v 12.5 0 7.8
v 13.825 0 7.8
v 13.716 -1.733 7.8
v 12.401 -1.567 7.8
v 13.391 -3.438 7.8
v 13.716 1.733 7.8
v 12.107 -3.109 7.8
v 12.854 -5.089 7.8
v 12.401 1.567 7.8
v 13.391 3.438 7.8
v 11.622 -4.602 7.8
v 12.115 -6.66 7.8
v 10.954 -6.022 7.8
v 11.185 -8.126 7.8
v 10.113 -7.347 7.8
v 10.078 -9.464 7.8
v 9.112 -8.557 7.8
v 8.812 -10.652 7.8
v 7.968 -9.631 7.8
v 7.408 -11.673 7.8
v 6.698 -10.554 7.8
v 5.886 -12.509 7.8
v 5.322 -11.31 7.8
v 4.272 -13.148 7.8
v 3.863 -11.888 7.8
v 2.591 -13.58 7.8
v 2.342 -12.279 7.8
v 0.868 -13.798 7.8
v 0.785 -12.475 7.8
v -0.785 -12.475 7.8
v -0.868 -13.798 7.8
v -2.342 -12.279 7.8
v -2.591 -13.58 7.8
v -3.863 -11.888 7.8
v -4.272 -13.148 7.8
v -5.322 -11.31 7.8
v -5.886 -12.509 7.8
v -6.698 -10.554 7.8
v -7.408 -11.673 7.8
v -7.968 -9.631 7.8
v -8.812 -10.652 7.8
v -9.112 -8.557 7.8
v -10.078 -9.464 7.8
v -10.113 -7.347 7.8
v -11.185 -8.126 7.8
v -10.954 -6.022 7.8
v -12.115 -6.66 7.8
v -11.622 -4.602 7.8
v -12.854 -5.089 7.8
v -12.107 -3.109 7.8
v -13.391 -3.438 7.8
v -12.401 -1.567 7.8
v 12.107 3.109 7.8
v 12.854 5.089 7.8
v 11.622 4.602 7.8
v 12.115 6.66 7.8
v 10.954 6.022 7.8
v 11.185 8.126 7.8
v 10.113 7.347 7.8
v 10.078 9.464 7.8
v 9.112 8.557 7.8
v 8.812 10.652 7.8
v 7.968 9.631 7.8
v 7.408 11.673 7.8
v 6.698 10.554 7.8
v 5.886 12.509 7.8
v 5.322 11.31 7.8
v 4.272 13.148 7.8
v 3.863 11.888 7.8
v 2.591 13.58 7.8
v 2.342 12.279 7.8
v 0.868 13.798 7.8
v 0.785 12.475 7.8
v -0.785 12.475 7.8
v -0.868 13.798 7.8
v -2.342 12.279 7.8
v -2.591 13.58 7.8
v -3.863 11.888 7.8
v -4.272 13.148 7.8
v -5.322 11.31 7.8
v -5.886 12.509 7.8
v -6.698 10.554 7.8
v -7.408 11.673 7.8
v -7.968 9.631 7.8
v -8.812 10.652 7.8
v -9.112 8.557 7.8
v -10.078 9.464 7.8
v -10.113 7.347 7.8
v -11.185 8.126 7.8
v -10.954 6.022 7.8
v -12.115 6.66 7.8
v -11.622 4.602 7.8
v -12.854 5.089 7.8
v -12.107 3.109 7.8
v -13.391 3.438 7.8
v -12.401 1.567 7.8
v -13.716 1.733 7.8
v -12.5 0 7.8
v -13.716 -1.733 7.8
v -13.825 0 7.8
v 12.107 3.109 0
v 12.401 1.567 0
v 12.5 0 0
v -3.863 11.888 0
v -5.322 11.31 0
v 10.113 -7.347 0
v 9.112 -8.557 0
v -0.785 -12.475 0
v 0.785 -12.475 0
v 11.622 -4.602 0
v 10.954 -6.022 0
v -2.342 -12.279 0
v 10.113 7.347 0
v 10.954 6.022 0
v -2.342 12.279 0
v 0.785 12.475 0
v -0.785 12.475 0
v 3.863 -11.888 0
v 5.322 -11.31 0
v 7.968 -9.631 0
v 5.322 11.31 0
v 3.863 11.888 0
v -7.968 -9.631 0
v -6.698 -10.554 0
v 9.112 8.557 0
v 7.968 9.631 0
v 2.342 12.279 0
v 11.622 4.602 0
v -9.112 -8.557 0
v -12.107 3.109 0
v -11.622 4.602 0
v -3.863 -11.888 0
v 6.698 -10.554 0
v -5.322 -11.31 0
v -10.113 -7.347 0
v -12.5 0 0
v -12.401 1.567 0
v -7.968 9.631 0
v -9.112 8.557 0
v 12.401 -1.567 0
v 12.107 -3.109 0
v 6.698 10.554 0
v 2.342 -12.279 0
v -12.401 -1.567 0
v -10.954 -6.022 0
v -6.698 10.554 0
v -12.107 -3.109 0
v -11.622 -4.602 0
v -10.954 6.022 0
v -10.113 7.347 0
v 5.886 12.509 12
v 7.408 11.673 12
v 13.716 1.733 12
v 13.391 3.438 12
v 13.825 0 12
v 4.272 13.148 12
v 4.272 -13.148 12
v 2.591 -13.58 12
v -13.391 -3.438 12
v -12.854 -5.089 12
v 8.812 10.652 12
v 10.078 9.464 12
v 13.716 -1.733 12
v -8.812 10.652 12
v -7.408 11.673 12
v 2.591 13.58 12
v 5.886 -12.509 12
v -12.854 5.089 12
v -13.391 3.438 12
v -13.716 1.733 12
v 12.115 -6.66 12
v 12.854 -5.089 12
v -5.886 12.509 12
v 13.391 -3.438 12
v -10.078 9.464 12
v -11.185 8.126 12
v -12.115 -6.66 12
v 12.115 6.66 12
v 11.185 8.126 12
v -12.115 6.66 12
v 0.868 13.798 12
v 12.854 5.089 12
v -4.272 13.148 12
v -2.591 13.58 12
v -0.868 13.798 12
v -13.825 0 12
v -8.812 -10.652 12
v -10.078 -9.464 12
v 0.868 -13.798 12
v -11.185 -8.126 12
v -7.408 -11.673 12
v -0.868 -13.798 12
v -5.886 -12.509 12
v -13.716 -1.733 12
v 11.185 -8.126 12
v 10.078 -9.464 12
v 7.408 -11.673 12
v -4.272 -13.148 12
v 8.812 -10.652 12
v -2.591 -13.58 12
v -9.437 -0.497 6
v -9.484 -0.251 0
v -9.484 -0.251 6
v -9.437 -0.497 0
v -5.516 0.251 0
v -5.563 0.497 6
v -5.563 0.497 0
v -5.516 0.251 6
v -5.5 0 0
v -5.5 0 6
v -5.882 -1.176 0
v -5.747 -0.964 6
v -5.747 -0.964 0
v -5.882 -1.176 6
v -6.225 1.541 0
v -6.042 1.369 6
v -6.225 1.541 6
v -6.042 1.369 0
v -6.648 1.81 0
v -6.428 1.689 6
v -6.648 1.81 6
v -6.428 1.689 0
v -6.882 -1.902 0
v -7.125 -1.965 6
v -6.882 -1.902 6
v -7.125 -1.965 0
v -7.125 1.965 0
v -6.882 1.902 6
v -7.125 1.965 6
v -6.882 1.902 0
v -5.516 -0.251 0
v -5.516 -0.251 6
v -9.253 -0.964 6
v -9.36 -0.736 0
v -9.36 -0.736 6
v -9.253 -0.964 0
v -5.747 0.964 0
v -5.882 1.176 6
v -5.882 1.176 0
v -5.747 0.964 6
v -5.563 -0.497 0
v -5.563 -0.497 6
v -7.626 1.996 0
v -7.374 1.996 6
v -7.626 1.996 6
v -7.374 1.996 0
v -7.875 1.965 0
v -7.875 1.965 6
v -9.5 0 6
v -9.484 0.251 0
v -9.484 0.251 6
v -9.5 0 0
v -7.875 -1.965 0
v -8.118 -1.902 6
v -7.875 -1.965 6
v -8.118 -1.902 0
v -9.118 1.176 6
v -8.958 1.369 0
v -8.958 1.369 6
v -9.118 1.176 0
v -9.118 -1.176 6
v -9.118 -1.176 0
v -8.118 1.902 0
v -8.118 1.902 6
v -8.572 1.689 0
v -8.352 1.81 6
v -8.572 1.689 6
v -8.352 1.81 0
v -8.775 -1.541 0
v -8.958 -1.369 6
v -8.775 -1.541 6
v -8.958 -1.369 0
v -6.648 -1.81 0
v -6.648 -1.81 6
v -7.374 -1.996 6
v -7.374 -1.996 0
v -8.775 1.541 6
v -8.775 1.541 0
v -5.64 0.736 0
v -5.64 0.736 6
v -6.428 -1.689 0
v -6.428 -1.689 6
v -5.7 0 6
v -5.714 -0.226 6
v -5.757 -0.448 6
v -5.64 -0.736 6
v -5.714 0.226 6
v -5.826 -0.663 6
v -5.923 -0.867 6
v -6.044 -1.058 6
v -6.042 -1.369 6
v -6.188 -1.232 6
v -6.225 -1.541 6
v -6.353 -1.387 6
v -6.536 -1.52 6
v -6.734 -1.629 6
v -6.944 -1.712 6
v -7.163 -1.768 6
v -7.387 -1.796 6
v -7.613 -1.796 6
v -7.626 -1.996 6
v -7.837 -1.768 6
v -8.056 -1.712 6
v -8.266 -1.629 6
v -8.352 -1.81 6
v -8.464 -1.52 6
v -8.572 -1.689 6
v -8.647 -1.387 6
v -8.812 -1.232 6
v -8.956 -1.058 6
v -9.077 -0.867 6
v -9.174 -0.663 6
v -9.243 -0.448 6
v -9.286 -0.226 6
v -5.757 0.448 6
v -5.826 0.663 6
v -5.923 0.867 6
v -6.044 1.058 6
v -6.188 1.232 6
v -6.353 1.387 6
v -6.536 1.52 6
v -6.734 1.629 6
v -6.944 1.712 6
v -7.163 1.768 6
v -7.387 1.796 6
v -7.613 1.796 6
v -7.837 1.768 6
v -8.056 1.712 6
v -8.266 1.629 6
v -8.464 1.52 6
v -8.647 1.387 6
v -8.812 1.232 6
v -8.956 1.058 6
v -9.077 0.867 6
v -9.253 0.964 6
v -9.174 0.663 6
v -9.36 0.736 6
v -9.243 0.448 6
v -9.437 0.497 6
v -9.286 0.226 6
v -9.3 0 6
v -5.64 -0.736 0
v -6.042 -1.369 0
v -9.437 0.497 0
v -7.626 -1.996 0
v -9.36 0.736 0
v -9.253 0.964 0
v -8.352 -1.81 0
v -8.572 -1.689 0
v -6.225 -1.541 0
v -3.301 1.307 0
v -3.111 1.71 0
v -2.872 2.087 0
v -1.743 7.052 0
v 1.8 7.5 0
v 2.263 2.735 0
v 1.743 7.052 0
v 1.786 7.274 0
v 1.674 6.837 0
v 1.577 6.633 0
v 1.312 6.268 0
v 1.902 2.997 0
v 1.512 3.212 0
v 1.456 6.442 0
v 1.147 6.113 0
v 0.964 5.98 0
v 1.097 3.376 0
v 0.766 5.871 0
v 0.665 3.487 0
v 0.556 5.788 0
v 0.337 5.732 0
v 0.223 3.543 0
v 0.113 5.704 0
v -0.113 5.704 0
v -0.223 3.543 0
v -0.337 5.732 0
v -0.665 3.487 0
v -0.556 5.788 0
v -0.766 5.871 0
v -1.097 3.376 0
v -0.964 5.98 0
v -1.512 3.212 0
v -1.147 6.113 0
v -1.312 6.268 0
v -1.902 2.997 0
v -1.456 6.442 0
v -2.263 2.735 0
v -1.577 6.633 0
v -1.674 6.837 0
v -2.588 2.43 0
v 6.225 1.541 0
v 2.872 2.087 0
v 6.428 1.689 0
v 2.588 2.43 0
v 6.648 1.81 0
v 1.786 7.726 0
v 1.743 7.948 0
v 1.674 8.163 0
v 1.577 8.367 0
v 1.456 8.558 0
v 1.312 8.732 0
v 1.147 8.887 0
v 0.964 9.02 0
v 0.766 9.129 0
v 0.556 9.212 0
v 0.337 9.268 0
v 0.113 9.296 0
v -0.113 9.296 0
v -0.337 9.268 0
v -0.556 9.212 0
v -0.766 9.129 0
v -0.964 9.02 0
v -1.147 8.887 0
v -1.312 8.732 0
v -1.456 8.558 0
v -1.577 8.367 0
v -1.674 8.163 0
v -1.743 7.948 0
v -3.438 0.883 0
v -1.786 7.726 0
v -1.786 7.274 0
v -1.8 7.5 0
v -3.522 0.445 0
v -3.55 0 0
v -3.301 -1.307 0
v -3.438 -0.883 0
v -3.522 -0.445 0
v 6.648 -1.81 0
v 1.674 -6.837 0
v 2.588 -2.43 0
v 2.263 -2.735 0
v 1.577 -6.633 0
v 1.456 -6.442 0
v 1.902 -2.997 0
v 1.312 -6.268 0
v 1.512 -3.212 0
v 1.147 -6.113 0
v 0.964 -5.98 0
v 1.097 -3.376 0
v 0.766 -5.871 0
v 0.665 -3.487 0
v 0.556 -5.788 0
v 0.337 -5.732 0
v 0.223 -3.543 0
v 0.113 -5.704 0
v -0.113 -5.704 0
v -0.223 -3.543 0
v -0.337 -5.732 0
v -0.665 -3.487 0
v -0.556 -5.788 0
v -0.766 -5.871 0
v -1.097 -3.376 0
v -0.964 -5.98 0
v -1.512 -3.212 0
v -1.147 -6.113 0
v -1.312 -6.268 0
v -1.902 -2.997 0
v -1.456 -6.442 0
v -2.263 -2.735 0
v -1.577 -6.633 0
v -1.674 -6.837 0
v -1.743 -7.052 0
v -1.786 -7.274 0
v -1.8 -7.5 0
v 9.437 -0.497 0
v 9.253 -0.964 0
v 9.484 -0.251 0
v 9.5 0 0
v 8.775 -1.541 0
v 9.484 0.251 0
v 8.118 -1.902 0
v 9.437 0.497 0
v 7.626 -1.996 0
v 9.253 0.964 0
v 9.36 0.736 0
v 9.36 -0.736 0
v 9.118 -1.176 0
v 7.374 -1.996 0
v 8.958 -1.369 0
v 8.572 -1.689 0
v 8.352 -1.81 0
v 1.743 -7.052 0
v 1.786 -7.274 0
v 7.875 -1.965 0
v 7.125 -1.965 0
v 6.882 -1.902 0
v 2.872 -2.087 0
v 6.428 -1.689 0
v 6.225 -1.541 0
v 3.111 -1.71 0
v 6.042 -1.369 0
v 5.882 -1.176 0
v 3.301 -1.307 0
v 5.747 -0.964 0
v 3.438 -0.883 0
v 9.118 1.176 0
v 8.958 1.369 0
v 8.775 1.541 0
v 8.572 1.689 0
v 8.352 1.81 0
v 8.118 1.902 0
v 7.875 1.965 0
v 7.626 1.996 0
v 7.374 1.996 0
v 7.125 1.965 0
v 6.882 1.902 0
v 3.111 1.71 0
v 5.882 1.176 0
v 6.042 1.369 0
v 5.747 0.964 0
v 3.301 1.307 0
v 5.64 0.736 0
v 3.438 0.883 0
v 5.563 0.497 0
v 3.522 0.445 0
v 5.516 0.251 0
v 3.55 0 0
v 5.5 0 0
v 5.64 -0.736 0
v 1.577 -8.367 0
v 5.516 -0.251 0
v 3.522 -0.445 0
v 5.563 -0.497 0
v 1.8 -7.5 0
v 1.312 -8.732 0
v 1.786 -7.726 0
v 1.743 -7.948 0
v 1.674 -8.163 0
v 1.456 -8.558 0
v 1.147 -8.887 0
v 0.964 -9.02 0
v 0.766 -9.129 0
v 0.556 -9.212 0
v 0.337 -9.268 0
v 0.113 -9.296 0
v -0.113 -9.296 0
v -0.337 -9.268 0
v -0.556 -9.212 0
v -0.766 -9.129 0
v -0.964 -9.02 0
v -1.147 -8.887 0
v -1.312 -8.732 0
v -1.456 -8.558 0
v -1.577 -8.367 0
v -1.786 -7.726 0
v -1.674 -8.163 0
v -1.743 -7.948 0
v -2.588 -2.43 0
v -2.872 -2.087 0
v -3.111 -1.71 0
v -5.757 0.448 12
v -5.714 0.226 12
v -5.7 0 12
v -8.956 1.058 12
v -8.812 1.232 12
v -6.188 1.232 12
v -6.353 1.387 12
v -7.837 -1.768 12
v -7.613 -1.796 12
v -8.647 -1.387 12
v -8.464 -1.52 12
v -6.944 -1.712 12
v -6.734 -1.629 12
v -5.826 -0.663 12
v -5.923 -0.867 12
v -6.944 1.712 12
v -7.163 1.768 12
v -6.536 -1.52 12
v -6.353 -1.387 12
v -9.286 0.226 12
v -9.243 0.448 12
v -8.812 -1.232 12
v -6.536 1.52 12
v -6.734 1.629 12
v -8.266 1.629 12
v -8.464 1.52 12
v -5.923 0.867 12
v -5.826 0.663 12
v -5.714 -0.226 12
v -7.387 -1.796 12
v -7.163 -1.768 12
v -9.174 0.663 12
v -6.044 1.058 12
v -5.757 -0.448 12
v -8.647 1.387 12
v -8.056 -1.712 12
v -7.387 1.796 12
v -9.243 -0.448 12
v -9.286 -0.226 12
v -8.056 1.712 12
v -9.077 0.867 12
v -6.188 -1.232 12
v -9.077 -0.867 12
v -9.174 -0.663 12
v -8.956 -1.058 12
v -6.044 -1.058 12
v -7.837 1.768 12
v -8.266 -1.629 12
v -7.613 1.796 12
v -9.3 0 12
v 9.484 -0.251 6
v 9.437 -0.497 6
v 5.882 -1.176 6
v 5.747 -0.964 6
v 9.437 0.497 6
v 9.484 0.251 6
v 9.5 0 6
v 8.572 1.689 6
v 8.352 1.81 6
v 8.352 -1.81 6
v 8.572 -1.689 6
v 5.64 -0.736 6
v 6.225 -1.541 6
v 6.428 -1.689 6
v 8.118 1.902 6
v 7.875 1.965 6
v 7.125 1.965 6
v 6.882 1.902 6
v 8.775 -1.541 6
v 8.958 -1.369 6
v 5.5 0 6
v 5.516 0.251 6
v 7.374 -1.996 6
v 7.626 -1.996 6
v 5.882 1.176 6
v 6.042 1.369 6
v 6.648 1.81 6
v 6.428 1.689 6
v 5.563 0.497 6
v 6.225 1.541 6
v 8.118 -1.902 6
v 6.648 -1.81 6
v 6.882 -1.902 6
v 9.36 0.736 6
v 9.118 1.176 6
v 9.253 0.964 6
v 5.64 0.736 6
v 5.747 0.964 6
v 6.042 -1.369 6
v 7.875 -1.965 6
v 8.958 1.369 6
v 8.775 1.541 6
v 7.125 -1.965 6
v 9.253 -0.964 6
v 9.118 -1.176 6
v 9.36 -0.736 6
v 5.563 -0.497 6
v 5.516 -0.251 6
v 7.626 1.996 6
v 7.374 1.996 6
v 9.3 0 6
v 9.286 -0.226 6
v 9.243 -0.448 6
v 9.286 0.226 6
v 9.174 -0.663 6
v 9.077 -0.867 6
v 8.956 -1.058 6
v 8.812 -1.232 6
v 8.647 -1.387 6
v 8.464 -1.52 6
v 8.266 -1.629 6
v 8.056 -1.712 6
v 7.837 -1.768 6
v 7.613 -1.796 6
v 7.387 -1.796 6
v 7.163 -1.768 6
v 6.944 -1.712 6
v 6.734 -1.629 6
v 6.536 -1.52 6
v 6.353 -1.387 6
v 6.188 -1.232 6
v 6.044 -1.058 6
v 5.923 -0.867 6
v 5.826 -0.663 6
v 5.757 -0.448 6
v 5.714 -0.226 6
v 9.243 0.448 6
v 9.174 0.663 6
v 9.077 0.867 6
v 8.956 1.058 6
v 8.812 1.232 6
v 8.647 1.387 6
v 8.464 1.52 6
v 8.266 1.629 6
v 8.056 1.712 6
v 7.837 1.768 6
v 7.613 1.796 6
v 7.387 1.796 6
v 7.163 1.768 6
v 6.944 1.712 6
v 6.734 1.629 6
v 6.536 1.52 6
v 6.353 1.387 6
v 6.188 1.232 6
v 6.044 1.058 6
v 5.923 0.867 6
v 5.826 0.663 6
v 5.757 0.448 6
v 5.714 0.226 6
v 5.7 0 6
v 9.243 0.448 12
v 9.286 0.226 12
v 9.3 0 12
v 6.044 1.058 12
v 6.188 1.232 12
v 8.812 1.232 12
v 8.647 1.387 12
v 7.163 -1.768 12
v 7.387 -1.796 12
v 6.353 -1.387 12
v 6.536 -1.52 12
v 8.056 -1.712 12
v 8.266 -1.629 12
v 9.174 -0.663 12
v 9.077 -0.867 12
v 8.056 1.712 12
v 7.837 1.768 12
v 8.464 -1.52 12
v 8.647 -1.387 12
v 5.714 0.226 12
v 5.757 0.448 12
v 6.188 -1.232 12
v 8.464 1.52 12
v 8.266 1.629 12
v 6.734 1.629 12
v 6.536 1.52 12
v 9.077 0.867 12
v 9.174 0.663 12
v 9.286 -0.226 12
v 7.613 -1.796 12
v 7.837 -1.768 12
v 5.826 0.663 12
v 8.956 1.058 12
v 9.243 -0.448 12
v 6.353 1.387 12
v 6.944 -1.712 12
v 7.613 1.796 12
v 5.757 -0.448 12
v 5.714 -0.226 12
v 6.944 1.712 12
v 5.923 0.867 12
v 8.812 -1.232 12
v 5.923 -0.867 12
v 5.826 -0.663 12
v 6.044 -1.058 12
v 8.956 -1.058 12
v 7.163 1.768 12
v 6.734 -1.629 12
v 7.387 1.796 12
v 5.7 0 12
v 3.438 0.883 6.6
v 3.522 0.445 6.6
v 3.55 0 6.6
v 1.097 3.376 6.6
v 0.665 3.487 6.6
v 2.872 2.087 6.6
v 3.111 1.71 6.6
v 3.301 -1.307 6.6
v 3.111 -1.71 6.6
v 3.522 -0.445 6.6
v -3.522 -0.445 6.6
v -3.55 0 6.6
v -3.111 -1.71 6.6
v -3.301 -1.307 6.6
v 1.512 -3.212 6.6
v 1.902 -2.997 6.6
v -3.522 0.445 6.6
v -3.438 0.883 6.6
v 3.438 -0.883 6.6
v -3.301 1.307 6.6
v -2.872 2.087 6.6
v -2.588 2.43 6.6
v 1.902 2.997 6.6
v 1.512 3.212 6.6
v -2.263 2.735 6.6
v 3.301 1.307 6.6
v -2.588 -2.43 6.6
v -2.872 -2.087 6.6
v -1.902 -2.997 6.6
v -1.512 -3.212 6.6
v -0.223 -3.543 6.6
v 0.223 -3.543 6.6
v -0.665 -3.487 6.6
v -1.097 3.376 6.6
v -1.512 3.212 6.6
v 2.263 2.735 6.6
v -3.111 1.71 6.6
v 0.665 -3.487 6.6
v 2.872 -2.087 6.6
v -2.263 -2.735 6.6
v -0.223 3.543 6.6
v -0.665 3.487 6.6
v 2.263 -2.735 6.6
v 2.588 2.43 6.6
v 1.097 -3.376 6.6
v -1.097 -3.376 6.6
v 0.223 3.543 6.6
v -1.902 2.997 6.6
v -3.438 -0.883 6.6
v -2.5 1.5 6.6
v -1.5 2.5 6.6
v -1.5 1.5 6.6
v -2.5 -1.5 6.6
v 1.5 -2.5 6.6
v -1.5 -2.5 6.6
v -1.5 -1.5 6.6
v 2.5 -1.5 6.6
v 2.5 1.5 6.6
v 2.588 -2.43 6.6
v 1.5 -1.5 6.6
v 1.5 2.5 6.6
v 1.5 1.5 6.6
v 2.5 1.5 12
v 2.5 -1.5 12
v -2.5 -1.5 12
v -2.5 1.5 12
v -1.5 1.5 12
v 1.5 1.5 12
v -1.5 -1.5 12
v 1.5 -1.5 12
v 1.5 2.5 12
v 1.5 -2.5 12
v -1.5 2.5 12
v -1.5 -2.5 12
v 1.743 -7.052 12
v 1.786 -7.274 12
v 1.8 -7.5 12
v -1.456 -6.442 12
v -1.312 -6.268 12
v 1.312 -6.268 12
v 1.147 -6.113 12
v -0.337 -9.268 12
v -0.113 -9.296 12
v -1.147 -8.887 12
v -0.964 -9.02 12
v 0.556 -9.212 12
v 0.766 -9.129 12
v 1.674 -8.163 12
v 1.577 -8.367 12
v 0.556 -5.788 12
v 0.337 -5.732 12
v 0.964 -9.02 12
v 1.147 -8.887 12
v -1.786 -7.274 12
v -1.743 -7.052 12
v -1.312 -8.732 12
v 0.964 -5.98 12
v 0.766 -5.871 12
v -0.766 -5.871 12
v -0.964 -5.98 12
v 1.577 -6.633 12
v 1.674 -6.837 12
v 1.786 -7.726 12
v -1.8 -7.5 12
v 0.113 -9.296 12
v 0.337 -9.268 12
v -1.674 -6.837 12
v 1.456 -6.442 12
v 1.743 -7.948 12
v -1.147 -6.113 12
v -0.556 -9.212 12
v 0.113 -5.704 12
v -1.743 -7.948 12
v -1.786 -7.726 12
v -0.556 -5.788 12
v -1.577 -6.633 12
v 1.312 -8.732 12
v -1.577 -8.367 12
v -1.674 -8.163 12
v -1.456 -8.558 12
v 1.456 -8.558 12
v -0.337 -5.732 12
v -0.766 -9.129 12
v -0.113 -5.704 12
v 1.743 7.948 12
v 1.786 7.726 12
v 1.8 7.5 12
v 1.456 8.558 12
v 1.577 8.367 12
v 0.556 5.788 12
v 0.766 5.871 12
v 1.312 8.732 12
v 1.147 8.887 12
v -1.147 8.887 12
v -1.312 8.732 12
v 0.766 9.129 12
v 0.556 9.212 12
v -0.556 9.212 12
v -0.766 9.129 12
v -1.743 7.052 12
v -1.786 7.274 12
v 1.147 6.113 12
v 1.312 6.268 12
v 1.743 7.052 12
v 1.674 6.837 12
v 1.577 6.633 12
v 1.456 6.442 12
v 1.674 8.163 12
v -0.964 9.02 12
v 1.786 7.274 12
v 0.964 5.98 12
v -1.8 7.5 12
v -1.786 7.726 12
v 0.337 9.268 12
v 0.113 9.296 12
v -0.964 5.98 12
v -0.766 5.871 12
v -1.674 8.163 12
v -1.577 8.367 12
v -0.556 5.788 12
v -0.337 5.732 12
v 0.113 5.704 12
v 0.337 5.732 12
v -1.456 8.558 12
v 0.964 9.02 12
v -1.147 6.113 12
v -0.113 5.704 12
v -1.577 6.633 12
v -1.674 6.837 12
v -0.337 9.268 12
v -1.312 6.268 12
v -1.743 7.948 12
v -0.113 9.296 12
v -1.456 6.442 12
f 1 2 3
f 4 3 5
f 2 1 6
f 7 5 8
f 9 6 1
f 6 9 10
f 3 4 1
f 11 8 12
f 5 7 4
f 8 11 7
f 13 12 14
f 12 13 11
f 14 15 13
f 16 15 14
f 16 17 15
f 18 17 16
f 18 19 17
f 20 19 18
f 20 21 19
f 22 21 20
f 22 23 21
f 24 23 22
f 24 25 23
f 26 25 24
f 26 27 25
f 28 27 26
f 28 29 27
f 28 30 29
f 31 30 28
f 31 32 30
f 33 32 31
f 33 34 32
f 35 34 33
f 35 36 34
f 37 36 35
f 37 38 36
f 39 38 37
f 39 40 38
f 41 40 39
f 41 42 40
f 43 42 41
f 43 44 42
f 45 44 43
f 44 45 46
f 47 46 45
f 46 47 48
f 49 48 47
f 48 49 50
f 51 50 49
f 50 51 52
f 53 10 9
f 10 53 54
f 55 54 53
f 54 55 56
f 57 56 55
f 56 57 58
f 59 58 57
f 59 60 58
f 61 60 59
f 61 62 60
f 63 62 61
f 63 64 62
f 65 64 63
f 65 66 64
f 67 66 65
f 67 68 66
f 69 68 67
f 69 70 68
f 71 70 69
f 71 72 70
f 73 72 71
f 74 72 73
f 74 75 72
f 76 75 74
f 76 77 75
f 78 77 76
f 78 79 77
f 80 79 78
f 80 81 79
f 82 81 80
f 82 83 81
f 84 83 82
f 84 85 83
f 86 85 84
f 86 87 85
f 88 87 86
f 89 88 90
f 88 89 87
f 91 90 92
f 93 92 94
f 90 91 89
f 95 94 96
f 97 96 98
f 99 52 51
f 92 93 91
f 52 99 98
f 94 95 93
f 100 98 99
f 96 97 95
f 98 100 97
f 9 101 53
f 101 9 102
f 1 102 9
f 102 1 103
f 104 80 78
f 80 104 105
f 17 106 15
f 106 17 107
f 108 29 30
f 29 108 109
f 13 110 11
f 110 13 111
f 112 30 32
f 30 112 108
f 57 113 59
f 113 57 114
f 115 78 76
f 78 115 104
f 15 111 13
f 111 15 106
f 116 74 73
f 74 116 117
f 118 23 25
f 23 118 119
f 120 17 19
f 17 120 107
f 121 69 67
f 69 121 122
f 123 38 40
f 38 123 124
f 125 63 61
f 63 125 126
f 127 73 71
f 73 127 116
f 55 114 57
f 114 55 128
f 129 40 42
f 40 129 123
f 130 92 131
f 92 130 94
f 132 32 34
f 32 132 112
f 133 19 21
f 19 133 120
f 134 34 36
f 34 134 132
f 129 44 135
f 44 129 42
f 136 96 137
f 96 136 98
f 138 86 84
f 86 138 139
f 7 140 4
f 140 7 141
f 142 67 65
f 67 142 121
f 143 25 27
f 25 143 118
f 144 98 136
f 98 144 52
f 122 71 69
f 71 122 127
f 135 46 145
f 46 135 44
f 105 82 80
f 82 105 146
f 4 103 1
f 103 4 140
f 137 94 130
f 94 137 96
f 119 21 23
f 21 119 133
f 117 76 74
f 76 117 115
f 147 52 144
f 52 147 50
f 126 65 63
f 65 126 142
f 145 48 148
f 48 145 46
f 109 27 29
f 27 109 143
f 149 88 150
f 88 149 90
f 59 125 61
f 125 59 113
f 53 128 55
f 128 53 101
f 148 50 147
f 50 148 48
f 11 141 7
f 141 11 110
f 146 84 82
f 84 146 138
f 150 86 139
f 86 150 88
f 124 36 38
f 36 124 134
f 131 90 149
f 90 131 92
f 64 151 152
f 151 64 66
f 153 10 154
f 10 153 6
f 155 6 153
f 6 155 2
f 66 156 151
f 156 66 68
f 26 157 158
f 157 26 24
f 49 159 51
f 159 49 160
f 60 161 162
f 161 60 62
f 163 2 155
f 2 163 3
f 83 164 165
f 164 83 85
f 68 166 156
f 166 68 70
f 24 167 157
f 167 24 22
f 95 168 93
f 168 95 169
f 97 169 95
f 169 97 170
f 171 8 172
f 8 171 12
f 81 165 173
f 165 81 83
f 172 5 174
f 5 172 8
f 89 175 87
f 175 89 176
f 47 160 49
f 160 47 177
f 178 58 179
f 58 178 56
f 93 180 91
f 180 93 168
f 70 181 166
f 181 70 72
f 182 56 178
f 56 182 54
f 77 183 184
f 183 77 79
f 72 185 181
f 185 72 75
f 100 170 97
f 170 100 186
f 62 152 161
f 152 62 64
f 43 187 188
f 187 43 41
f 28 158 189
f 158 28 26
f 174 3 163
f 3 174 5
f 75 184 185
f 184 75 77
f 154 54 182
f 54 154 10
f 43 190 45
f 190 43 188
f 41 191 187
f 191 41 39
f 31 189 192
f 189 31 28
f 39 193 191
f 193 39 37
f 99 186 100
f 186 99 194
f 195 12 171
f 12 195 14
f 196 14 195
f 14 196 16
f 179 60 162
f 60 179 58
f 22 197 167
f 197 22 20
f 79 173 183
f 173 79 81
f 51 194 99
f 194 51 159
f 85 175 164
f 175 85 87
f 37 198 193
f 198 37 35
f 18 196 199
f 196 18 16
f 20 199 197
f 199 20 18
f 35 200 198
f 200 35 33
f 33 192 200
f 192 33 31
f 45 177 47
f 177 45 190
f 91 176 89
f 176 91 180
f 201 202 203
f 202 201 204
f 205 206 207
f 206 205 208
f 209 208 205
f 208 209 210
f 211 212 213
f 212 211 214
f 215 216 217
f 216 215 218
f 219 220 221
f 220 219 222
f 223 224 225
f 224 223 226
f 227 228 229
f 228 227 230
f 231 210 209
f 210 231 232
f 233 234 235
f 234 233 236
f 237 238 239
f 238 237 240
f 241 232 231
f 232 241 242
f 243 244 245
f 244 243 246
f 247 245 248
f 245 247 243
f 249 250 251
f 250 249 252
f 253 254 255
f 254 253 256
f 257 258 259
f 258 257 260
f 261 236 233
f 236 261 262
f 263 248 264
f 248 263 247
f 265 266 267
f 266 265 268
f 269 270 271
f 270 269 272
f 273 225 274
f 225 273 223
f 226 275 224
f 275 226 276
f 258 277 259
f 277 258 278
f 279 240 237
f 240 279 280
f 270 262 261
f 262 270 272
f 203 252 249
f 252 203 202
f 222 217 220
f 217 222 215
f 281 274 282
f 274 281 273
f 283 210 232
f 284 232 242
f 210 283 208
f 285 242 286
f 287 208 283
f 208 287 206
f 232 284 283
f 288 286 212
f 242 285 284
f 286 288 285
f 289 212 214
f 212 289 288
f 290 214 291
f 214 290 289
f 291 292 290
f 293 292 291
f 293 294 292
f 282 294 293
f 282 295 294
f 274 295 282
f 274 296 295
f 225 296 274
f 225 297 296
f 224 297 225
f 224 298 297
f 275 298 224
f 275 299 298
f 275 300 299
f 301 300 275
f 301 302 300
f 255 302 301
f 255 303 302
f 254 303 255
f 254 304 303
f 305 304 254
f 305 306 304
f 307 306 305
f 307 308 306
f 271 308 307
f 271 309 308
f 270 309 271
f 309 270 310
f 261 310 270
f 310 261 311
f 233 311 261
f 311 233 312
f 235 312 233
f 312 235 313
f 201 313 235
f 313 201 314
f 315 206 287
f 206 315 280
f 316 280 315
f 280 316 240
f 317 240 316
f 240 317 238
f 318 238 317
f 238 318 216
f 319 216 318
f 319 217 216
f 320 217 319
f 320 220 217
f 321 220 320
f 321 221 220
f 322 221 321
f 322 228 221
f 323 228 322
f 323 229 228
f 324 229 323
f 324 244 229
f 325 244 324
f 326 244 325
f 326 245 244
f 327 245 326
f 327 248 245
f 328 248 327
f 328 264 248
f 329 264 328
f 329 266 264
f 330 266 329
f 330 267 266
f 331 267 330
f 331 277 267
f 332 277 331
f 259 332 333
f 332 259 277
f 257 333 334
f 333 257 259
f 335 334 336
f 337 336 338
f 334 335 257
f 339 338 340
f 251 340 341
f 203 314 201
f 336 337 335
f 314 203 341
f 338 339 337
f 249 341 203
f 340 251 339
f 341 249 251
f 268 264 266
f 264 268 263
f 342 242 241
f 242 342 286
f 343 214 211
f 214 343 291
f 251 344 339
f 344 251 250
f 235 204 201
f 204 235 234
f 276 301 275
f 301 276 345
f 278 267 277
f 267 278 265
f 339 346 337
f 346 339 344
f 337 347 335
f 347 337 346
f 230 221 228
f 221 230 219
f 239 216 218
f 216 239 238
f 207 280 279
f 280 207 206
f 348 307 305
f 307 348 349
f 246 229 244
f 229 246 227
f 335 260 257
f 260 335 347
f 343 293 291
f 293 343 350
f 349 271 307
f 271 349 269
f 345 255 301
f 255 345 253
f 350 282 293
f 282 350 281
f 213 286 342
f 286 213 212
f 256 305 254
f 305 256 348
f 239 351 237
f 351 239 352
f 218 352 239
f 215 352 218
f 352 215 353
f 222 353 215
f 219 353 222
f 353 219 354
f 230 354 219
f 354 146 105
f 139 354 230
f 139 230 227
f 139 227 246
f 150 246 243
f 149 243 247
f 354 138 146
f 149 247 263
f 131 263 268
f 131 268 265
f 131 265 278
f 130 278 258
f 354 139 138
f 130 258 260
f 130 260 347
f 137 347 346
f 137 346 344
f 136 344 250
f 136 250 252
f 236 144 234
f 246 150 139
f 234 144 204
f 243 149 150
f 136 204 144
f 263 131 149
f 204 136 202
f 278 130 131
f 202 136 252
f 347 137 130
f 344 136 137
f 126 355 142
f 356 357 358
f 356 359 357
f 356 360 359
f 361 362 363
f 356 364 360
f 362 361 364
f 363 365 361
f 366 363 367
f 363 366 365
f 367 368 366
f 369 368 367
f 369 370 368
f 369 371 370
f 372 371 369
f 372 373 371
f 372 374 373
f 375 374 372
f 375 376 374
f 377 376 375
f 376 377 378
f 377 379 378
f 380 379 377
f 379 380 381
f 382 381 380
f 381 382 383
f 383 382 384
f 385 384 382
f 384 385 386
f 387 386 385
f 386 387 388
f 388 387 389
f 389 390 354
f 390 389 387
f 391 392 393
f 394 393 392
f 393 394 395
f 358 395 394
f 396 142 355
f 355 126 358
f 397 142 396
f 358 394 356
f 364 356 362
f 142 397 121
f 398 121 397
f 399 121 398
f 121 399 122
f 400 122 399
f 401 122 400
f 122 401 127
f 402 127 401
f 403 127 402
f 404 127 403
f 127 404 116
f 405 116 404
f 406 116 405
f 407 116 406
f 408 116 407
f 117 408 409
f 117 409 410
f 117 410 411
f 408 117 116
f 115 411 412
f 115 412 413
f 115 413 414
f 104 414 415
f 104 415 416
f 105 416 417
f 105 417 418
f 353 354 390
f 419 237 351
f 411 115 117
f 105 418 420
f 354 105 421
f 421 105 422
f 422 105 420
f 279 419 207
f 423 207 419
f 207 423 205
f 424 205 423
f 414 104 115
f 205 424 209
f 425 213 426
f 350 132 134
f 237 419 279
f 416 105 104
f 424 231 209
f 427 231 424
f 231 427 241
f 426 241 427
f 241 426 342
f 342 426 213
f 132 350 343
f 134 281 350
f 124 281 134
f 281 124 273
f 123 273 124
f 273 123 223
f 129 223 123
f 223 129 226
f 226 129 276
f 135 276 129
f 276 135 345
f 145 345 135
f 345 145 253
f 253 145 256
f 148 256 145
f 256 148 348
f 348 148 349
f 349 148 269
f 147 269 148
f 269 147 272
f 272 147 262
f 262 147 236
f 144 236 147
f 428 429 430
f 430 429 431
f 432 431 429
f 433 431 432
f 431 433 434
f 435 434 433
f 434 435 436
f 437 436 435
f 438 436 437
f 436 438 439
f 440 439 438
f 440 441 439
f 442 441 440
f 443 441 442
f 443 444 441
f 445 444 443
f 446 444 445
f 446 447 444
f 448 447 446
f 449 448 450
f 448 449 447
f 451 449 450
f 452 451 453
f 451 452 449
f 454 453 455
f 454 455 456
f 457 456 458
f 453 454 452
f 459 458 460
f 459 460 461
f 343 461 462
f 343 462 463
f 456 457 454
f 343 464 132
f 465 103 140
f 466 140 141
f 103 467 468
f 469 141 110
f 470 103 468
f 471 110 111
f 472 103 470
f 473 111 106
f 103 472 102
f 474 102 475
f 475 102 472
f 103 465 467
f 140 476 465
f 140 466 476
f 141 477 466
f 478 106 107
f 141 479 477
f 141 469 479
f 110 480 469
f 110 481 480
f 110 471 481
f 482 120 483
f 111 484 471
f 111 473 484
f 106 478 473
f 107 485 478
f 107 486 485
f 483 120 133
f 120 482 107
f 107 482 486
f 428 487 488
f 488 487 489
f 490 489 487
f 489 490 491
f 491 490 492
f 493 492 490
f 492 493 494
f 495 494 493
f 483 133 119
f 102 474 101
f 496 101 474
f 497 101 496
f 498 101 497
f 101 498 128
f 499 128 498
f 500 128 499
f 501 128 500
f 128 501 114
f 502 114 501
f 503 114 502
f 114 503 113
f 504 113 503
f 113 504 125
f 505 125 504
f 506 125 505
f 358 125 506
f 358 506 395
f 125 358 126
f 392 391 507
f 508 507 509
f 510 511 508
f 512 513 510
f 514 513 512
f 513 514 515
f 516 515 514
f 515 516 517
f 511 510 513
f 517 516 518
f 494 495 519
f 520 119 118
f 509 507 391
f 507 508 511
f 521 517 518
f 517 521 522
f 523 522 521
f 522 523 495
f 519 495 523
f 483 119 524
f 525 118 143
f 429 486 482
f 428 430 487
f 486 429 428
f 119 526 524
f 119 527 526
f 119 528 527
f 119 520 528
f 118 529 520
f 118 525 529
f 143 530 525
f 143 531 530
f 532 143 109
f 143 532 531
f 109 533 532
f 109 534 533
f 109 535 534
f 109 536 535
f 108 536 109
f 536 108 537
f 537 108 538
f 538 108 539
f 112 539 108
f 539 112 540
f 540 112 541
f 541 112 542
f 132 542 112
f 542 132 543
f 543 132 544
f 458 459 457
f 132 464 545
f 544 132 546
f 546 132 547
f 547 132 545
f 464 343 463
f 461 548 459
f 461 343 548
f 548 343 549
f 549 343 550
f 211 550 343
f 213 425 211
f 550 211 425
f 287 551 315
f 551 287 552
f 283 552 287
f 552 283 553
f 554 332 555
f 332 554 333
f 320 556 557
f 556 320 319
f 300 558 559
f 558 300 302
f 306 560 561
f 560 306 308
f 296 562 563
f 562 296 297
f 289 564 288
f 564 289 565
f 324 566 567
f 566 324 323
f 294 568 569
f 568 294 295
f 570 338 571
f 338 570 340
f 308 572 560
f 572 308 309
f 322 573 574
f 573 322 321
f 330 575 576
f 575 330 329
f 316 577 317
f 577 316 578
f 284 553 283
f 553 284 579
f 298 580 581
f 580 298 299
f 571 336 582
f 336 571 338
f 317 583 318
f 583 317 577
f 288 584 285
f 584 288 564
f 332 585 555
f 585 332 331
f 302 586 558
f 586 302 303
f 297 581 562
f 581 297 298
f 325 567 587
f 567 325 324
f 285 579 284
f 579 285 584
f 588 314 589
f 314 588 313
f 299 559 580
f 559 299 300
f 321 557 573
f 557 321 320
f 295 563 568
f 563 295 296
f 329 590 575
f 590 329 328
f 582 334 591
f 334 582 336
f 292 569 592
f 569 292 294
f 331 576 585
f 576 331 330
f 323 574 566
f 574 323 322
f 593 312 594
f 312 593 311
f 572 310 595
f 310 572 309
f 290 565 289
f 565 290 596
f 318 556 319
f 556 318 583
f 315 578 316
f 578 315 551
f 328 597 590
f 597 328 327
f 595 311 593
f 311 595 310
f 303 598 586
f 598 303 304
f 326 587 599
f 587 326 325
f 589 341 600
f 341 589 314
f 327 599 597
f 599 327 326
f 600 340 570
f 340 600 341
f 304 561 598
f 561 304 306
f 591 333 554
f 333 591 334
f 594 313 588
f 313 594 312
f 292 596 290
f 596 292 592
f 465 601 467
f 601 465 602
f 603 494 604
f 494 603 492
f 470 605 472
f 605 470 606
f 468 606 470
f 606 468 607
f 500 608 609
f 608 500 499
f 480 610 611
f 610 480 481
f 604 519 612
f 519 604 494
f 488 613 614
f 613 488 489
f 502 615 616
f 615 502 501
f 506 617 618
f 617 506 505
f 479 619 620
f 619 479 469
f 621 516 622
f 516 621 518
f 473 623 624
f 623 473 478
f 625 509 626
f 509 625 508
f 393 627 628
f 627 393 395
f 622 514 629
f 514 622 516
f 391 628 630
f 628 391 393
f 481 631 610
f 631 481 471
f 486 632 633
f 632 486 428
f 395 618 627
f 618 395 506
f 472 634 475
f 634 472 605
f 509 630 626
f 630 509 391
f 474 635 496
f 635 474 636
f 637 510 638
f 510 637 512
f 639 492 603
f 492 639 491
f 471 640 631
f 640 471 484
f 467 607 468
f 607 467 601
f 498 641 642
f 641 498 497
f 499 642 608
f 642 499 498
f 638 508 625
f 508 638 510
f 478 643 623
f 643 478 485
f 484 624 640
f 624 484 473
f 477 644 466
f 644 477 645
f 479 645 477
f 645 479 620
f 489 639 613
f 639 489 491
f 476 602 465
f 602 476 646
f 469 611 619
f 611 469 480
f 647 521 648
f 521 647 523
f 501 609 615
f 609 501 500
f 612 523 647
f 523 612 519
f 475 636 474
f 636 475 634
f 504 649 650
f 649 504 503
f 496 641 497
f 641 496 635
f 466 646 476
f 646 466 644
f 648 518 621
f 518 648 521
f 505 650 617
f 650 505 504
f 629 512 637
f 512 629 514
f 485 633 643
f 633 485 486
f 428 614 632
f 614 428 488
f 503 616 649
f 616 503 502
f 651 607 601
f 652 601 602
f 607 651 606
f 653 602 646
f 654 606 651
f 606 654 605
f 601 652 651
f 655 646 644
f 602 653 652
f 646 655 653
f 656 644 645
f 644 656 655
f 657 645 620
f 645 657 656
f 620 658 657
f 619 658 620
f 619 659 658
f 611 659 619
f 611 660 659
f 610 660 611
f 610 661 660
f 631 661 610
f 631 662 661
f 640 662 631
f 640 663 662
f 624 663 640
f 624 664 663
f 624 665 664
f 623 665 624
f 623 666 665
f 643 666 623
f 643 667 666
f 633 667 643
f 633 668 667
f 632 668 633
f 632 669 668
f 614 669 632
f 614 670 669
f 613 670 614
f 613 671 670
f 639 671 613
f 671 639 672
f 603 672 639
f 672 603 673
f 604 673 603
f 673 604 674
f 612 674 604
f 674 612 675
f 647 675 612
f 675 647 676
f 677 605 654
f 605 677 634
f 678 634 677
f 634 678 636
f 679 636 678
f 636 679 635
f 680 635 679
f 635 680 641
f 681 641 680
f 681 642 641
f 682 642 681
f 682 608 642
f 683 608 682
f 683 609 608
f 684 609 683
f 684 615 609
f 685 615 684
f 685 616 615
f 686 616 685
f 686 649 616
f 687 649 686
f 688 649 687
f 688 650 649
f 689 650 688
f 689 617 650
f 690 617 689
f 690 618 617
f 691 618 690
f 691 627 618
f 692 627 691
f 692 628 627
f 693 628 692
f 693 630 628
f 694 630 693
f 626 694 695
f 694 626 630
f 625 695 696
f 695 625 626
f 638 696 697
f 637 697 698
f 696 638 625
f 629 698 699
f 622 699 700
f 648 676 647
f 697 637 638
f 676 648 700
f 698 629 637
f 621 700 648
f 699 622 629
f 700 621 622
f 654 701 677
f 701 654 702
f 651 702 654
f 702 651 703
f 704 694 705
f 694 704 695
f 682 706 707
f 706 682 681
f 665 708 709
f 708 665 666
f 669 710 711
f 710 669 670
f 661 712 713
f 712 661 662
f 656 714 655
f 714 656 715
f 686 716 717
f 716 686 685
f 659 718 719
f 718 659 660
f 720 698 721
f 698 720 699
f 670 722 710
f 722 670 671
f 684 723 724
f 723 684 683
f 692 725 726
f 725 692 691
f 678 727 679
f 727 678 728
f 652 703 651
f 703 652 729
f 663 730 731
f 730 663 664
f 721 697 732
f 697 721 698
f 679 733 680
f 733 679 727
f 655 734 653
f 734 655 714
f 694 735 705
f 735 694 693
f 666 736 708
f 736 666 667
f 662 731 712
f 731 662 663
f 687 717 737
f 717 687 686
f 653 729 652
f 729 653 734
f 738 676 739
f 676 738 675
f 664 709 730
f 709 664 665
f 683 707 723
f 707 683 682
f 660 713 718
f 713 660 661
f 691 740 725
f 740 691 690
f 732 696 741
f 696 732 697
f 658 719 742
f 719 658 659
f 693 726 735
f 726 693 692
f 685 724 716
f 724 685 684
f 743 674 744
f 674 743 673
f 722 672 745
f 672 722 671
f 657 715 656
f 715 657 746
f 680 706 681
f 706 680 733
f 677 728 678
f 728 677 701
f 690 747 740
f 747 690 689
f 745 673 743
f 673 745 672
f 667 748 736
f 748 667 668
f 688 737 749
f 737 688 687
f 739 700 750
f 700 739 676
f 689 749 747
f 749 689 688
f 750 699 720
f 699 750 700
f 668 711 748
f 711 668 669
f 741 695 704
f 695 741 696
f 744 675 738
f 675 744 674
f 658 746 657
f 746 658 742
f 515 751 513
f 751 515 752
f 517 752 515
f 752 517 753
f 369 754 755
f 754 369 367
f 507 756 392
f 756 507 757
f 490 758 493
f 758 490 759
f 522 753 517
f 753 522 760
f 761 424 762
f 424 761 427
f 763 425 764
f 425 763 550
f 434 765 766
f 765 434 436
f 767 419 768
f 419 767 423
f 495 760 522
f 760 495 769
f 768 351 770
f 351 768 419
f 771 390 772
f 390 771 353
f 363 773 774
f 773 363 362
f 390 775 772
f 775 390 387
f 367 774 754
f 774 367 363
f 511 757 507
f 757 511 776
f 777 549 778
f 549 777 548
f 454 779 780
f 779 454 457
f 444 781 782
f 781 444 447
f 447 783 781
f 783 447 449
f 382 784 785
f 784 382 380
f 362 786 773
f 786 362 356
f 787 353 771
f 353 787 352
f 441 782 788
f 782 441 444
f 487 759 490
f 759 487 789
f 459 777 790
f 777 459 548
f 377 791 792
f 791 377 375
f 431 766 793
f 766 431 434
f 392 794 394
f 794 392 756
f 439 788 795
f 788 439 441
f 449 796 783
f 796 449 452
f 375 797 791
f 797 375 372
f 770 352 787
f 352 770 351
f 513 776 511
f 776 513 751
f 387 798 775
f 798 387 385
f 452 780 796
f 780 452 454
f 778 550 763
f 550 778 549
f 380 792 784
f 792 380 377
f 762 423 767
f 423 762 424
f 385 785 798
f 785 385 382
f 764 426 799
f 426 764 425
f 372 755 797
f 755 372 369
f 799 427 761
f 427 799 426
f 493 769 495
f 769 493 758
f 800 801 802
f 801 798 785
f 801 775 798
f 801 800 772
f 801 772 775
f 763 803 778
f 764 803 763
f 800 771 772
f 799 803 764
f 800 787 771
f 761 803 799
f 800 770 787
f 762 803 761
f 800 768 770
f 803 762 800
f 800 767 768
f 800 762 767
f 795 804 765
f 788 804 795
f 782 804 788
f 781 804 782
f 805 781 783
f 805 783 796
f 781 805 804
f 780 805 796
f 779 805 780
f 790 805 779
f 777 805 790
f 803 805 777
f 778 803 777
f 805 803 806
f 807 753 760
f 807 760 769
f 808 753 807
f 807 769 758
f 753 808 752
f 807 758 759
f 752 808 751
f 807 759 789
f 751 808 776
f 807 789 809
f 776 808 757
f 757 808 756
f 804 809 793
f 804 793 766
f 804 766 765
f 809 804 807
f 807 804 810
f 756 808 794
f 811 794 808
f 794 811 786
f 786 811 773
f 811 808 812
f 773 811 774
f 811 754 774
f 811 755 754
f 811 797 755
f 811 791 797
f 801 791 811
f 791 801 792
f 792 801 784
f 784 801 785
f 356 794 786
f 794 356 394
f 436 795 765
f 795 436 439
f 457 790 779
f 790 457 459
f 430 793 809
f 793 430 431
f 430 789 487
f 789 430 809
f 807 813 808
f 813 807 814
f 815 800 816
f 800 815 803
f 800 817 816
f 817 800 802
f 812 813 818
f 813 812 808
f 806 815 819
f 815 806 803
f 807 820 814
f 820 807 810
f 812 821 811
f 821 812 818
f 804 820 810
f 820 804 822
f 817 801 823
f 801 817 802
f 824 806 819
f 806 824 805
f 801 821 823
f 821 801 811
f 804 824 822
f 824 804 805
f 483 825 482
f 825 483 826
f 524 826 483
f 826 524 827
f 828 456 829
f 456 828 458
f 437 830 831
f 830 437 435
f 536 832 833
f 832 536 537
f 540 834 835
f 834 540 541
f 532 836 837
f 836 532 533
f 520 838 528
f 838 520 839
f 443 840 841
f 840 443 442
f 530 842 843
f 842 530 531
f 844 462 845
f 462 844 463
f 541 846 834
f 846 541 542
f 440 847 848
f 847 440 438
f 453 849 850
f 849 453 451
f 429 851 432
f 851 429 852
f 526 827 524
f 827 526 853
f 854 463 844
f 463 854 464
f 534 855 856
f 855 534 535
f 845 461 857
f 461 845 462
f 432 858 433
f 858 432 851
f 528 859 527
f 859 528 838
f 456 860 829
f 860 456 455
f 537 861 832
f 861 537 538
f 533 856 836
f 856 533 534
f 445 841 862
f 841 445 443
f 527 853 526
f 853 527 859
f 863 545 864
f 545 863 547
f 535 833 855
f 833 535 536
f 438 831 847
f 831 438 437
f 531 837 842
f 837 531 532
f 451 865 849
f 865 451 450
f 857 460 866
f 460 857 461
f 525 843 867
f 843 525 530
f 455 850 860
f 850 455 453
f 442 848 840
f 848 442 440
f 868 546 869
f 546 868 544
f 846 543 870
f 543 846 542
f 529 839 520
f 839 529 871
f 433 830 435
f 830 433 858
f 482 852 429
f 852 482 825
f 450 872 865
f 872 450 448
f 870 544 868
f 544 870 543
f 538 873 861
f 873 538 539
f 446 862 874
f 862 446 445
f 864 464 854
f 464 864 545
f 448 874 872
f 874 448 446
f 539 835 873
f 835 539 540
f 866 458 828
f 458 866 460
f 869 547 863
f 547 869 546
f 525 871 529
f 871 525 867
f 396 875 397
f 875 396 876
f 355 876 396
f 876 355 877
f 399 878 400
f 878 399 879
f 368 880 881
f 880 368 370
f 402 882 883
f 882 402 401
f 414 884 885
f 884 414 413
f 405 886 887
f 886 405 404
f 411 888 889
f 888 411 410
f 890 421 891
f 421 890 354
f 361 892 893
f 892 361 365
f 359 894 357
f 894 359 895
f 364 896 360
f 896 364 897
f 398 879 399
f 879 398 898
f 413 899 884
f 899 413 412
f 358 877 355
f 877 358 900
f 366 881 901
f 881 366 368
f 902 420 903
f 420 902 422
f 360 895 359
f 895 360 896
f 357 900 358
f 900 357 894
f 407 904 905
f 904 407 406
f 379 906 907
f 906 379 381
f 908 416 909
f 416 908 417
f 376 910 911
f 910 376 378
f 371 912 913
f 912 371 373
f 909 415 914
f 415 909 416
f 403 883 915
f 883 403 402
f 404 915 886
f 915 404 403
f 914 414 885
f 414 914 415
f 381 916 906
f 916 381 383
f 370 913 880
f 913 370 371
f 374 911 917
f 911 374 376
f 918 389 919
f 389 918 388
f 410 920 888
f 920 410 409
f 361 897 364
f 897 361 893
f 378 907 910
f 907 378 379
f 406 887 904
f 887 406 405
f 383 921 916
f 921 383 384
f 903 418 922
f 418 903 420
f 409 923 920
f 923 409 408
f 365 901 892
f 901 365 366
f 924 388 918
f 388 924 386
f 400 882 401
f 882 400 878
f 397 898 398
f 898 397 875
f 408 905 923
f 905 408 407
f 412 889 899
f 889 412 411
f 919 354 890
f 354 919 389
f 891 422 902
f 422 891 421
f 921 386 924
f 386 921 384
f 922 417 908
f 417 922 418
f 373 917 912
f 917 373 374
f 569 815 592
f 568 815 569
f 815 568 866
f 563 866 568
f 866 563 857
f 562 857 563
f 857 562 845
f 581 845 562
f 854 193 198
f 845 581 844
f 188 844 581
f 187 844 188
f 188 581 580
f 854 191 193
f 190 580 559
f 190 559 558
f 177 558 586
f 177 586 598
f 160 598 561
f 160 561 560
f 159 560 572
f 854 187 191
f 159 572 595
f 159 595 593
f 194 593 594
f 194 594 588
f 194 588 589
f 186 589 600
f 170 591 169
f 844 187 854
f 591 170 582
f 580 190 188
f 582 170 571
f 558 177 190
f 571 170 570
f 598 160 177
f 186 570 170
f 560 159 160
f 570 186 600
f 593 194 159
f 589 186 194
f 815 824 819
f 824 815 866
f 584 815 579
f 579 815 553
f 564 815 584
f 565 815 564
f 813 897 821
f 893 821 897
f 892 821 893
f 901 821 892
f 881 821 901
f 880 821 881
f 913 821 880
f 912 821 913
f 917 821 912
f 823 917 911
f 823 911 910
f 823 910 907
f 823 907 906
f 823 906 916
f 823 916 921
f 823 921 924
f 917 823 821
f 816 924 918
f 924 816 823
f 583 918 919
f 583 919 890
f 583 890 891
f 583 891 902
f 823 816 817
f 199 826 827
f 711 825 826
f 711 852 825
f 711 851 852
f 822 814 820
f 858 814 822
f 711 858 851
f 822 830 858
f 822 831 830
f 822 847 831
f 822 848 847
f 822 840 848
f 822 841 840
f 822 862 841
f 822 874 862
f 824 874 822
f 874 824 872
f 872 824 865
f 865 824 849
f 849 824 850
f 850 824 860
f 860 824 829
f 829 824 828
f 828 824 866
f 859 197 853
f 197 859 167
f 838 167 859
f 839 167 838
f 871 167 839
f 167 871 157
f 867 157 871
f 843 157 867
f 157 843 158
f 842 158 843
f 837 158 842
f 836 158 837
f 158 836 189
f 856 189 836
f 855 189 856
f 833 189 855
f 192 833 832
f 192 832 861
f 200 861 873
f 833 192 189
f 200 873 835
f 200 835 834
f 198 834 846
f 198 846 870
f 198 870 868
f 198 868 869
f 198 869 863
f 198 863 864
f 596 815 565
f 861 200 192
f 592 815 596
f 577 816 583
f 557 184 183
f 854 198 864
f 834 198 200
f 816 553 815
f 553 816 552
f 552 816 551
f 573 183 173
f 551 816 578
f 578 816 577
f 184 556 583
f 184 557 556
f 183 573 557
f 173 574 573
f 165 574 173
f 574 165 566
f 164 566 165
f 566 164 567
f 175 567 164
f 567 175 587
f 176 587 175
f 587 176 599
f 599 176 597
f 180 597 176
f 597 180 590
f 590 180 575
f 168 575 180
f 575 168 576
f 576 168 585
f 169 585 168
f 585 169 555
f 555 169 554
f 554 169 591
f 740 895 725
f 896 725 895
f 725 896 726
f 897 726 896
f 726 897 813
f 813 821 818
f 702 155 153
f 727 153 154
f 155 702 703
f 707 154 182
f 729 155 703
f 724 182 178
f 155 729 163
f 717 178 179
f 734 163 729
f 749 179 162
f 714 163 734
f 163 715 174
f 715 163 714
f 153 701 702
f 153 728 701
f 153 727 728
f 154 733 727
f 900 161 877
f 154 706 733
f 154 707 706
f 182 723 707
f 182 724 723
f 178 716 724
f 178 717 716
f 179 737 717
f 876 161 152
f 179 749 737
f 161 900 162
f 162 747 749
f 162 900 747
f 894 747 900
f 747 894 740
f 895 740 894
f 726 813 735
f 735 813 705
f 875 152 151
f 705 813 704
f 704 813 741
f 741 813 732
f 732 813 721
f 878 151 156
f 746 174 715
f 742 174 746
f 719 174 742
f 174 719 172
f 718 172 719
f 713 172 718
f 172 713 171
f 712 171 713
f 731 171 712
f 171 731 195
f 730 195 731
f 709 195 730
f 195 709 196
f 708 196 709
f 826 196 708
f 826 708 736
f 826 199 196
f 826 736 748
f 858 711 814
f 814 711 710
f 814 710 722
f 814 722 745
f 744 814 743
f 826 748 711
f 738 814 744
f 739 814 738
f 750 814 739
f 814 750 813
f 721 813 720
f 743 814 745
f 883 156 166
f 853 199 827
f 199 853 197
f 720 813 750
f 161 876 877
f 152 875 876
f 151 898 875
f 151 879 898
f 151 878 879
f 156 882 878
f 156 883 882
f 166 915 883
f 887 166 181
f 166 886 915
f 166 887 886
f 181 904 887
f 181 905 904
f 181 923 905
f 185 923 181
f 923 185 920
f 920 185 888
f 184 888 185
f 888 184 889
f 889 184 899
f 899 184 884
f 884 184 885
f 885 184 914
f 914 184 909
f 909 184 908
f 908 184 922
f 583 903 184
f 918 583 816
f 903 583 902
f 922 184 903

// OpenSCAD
$fn = 50;

difference() {
	union() {
		translate(v = [0, 0, 0]) {
			rotate(a = [0, 0, 0]) {
				difference() {
					union() {
						translate(v = [0, 0, 6.0]) {
							rotate(a = [0, 0, 0]) {
								difference() {
									union() {
										translate(v = [0, 0, -6.0]) {
											cylinder(h = 12, r = 14.5);
										}
									}
									union() {
										translate(v = [0, 0, 0]) {
											rotate(a = [0, 0, 0]) {
												difference() {
													union() {
														translate(v = [0, 0, -1.8]) {
															cylinder(h = 3.6, r = 16.15);
														}
													}
													union() {
														translate(v = [0, 0, -1.81]) {
															cylinder(h = 3.62, r = 12.5);
														}
													}
												}
											}
										}
										translate(v = [0, 0, -3]) {
											rotate(a = [0, 0, 0]) {
												difference() {
													union() {
														translate(v = [0, 0, -1.8]) {
															cylinder(h = 3.6, r = 16.15);
														}
													}
													union() {
														translate(v = [0, 0, -1.81]) {
															cylinder(h = 3.62, r = 12.5);
														}
													}
												}
											}
										}
										translate(v = [0, 0, -6]) {
											rotate(a = [0, 0, 0]) {
												difference() {
													union() {
														translate(v = [0, 0, -1.8]) {
															cylinder(h = 3.6, r = 16.15);
														}
													}
													union() {
														translate(v = [0, 0, -1.81]) {
															cylinder(h = 3.62, r = 12.5);
														}
													}
												}
											}
										}
										translate(v = [0, 0, 0]) {
											rotate(a = [0, 0, 0]) {
												difference() {
													union() {
														translate(v = [0, 0, -21.0]) {
															cylinder(h = 42, r = 14.825);
														}
													}
													union() {
														translate(v = [0, 0, -21.01]) {
															cylinder(h = 42.02, r = 13.825);
														}
													}
												}
											}
										}
										translate(v = [-7.5, 0, -6.0]) {
											cylinder(h = 6, r = 2.0);
										}
										translate(v = [-7.5, 0, -7.0]) {
											cylinder(h = 14, r = 1.8);
										}
										translate(v = [7.5, 0, -6.0]) {
											cylinder(h = 6, r = 2.0);
										}
										translate(v = [7.5, 0, -7.0]) {
											cylinder(h = 14, r = 1.8);
										}
										translate(v = [0, 0, -6.000000000000001]) {
											cylinder(h = 6.6, r = 3.55);
										}
										translate(v = [-2.5, -1.5, -7.0]) {
											cube(size = [5, 3, 14]);
										}
										translate(v = [-1.5, -2.5, -7.0]) {
											cube(size = [3, 5, 14]);
										}
										translate(v = [0.0, -7.5, -7.0]) {
											cylinder(h = 14, r = 1.8);
										}
										translate(v = [0.0, 7.5, -7.0]) {
											cylinder(h = 14, r = 1.8);
										}
									}
								}
							}
						}
					}
					union();
				}
			}
		}
	}
	union();
}
